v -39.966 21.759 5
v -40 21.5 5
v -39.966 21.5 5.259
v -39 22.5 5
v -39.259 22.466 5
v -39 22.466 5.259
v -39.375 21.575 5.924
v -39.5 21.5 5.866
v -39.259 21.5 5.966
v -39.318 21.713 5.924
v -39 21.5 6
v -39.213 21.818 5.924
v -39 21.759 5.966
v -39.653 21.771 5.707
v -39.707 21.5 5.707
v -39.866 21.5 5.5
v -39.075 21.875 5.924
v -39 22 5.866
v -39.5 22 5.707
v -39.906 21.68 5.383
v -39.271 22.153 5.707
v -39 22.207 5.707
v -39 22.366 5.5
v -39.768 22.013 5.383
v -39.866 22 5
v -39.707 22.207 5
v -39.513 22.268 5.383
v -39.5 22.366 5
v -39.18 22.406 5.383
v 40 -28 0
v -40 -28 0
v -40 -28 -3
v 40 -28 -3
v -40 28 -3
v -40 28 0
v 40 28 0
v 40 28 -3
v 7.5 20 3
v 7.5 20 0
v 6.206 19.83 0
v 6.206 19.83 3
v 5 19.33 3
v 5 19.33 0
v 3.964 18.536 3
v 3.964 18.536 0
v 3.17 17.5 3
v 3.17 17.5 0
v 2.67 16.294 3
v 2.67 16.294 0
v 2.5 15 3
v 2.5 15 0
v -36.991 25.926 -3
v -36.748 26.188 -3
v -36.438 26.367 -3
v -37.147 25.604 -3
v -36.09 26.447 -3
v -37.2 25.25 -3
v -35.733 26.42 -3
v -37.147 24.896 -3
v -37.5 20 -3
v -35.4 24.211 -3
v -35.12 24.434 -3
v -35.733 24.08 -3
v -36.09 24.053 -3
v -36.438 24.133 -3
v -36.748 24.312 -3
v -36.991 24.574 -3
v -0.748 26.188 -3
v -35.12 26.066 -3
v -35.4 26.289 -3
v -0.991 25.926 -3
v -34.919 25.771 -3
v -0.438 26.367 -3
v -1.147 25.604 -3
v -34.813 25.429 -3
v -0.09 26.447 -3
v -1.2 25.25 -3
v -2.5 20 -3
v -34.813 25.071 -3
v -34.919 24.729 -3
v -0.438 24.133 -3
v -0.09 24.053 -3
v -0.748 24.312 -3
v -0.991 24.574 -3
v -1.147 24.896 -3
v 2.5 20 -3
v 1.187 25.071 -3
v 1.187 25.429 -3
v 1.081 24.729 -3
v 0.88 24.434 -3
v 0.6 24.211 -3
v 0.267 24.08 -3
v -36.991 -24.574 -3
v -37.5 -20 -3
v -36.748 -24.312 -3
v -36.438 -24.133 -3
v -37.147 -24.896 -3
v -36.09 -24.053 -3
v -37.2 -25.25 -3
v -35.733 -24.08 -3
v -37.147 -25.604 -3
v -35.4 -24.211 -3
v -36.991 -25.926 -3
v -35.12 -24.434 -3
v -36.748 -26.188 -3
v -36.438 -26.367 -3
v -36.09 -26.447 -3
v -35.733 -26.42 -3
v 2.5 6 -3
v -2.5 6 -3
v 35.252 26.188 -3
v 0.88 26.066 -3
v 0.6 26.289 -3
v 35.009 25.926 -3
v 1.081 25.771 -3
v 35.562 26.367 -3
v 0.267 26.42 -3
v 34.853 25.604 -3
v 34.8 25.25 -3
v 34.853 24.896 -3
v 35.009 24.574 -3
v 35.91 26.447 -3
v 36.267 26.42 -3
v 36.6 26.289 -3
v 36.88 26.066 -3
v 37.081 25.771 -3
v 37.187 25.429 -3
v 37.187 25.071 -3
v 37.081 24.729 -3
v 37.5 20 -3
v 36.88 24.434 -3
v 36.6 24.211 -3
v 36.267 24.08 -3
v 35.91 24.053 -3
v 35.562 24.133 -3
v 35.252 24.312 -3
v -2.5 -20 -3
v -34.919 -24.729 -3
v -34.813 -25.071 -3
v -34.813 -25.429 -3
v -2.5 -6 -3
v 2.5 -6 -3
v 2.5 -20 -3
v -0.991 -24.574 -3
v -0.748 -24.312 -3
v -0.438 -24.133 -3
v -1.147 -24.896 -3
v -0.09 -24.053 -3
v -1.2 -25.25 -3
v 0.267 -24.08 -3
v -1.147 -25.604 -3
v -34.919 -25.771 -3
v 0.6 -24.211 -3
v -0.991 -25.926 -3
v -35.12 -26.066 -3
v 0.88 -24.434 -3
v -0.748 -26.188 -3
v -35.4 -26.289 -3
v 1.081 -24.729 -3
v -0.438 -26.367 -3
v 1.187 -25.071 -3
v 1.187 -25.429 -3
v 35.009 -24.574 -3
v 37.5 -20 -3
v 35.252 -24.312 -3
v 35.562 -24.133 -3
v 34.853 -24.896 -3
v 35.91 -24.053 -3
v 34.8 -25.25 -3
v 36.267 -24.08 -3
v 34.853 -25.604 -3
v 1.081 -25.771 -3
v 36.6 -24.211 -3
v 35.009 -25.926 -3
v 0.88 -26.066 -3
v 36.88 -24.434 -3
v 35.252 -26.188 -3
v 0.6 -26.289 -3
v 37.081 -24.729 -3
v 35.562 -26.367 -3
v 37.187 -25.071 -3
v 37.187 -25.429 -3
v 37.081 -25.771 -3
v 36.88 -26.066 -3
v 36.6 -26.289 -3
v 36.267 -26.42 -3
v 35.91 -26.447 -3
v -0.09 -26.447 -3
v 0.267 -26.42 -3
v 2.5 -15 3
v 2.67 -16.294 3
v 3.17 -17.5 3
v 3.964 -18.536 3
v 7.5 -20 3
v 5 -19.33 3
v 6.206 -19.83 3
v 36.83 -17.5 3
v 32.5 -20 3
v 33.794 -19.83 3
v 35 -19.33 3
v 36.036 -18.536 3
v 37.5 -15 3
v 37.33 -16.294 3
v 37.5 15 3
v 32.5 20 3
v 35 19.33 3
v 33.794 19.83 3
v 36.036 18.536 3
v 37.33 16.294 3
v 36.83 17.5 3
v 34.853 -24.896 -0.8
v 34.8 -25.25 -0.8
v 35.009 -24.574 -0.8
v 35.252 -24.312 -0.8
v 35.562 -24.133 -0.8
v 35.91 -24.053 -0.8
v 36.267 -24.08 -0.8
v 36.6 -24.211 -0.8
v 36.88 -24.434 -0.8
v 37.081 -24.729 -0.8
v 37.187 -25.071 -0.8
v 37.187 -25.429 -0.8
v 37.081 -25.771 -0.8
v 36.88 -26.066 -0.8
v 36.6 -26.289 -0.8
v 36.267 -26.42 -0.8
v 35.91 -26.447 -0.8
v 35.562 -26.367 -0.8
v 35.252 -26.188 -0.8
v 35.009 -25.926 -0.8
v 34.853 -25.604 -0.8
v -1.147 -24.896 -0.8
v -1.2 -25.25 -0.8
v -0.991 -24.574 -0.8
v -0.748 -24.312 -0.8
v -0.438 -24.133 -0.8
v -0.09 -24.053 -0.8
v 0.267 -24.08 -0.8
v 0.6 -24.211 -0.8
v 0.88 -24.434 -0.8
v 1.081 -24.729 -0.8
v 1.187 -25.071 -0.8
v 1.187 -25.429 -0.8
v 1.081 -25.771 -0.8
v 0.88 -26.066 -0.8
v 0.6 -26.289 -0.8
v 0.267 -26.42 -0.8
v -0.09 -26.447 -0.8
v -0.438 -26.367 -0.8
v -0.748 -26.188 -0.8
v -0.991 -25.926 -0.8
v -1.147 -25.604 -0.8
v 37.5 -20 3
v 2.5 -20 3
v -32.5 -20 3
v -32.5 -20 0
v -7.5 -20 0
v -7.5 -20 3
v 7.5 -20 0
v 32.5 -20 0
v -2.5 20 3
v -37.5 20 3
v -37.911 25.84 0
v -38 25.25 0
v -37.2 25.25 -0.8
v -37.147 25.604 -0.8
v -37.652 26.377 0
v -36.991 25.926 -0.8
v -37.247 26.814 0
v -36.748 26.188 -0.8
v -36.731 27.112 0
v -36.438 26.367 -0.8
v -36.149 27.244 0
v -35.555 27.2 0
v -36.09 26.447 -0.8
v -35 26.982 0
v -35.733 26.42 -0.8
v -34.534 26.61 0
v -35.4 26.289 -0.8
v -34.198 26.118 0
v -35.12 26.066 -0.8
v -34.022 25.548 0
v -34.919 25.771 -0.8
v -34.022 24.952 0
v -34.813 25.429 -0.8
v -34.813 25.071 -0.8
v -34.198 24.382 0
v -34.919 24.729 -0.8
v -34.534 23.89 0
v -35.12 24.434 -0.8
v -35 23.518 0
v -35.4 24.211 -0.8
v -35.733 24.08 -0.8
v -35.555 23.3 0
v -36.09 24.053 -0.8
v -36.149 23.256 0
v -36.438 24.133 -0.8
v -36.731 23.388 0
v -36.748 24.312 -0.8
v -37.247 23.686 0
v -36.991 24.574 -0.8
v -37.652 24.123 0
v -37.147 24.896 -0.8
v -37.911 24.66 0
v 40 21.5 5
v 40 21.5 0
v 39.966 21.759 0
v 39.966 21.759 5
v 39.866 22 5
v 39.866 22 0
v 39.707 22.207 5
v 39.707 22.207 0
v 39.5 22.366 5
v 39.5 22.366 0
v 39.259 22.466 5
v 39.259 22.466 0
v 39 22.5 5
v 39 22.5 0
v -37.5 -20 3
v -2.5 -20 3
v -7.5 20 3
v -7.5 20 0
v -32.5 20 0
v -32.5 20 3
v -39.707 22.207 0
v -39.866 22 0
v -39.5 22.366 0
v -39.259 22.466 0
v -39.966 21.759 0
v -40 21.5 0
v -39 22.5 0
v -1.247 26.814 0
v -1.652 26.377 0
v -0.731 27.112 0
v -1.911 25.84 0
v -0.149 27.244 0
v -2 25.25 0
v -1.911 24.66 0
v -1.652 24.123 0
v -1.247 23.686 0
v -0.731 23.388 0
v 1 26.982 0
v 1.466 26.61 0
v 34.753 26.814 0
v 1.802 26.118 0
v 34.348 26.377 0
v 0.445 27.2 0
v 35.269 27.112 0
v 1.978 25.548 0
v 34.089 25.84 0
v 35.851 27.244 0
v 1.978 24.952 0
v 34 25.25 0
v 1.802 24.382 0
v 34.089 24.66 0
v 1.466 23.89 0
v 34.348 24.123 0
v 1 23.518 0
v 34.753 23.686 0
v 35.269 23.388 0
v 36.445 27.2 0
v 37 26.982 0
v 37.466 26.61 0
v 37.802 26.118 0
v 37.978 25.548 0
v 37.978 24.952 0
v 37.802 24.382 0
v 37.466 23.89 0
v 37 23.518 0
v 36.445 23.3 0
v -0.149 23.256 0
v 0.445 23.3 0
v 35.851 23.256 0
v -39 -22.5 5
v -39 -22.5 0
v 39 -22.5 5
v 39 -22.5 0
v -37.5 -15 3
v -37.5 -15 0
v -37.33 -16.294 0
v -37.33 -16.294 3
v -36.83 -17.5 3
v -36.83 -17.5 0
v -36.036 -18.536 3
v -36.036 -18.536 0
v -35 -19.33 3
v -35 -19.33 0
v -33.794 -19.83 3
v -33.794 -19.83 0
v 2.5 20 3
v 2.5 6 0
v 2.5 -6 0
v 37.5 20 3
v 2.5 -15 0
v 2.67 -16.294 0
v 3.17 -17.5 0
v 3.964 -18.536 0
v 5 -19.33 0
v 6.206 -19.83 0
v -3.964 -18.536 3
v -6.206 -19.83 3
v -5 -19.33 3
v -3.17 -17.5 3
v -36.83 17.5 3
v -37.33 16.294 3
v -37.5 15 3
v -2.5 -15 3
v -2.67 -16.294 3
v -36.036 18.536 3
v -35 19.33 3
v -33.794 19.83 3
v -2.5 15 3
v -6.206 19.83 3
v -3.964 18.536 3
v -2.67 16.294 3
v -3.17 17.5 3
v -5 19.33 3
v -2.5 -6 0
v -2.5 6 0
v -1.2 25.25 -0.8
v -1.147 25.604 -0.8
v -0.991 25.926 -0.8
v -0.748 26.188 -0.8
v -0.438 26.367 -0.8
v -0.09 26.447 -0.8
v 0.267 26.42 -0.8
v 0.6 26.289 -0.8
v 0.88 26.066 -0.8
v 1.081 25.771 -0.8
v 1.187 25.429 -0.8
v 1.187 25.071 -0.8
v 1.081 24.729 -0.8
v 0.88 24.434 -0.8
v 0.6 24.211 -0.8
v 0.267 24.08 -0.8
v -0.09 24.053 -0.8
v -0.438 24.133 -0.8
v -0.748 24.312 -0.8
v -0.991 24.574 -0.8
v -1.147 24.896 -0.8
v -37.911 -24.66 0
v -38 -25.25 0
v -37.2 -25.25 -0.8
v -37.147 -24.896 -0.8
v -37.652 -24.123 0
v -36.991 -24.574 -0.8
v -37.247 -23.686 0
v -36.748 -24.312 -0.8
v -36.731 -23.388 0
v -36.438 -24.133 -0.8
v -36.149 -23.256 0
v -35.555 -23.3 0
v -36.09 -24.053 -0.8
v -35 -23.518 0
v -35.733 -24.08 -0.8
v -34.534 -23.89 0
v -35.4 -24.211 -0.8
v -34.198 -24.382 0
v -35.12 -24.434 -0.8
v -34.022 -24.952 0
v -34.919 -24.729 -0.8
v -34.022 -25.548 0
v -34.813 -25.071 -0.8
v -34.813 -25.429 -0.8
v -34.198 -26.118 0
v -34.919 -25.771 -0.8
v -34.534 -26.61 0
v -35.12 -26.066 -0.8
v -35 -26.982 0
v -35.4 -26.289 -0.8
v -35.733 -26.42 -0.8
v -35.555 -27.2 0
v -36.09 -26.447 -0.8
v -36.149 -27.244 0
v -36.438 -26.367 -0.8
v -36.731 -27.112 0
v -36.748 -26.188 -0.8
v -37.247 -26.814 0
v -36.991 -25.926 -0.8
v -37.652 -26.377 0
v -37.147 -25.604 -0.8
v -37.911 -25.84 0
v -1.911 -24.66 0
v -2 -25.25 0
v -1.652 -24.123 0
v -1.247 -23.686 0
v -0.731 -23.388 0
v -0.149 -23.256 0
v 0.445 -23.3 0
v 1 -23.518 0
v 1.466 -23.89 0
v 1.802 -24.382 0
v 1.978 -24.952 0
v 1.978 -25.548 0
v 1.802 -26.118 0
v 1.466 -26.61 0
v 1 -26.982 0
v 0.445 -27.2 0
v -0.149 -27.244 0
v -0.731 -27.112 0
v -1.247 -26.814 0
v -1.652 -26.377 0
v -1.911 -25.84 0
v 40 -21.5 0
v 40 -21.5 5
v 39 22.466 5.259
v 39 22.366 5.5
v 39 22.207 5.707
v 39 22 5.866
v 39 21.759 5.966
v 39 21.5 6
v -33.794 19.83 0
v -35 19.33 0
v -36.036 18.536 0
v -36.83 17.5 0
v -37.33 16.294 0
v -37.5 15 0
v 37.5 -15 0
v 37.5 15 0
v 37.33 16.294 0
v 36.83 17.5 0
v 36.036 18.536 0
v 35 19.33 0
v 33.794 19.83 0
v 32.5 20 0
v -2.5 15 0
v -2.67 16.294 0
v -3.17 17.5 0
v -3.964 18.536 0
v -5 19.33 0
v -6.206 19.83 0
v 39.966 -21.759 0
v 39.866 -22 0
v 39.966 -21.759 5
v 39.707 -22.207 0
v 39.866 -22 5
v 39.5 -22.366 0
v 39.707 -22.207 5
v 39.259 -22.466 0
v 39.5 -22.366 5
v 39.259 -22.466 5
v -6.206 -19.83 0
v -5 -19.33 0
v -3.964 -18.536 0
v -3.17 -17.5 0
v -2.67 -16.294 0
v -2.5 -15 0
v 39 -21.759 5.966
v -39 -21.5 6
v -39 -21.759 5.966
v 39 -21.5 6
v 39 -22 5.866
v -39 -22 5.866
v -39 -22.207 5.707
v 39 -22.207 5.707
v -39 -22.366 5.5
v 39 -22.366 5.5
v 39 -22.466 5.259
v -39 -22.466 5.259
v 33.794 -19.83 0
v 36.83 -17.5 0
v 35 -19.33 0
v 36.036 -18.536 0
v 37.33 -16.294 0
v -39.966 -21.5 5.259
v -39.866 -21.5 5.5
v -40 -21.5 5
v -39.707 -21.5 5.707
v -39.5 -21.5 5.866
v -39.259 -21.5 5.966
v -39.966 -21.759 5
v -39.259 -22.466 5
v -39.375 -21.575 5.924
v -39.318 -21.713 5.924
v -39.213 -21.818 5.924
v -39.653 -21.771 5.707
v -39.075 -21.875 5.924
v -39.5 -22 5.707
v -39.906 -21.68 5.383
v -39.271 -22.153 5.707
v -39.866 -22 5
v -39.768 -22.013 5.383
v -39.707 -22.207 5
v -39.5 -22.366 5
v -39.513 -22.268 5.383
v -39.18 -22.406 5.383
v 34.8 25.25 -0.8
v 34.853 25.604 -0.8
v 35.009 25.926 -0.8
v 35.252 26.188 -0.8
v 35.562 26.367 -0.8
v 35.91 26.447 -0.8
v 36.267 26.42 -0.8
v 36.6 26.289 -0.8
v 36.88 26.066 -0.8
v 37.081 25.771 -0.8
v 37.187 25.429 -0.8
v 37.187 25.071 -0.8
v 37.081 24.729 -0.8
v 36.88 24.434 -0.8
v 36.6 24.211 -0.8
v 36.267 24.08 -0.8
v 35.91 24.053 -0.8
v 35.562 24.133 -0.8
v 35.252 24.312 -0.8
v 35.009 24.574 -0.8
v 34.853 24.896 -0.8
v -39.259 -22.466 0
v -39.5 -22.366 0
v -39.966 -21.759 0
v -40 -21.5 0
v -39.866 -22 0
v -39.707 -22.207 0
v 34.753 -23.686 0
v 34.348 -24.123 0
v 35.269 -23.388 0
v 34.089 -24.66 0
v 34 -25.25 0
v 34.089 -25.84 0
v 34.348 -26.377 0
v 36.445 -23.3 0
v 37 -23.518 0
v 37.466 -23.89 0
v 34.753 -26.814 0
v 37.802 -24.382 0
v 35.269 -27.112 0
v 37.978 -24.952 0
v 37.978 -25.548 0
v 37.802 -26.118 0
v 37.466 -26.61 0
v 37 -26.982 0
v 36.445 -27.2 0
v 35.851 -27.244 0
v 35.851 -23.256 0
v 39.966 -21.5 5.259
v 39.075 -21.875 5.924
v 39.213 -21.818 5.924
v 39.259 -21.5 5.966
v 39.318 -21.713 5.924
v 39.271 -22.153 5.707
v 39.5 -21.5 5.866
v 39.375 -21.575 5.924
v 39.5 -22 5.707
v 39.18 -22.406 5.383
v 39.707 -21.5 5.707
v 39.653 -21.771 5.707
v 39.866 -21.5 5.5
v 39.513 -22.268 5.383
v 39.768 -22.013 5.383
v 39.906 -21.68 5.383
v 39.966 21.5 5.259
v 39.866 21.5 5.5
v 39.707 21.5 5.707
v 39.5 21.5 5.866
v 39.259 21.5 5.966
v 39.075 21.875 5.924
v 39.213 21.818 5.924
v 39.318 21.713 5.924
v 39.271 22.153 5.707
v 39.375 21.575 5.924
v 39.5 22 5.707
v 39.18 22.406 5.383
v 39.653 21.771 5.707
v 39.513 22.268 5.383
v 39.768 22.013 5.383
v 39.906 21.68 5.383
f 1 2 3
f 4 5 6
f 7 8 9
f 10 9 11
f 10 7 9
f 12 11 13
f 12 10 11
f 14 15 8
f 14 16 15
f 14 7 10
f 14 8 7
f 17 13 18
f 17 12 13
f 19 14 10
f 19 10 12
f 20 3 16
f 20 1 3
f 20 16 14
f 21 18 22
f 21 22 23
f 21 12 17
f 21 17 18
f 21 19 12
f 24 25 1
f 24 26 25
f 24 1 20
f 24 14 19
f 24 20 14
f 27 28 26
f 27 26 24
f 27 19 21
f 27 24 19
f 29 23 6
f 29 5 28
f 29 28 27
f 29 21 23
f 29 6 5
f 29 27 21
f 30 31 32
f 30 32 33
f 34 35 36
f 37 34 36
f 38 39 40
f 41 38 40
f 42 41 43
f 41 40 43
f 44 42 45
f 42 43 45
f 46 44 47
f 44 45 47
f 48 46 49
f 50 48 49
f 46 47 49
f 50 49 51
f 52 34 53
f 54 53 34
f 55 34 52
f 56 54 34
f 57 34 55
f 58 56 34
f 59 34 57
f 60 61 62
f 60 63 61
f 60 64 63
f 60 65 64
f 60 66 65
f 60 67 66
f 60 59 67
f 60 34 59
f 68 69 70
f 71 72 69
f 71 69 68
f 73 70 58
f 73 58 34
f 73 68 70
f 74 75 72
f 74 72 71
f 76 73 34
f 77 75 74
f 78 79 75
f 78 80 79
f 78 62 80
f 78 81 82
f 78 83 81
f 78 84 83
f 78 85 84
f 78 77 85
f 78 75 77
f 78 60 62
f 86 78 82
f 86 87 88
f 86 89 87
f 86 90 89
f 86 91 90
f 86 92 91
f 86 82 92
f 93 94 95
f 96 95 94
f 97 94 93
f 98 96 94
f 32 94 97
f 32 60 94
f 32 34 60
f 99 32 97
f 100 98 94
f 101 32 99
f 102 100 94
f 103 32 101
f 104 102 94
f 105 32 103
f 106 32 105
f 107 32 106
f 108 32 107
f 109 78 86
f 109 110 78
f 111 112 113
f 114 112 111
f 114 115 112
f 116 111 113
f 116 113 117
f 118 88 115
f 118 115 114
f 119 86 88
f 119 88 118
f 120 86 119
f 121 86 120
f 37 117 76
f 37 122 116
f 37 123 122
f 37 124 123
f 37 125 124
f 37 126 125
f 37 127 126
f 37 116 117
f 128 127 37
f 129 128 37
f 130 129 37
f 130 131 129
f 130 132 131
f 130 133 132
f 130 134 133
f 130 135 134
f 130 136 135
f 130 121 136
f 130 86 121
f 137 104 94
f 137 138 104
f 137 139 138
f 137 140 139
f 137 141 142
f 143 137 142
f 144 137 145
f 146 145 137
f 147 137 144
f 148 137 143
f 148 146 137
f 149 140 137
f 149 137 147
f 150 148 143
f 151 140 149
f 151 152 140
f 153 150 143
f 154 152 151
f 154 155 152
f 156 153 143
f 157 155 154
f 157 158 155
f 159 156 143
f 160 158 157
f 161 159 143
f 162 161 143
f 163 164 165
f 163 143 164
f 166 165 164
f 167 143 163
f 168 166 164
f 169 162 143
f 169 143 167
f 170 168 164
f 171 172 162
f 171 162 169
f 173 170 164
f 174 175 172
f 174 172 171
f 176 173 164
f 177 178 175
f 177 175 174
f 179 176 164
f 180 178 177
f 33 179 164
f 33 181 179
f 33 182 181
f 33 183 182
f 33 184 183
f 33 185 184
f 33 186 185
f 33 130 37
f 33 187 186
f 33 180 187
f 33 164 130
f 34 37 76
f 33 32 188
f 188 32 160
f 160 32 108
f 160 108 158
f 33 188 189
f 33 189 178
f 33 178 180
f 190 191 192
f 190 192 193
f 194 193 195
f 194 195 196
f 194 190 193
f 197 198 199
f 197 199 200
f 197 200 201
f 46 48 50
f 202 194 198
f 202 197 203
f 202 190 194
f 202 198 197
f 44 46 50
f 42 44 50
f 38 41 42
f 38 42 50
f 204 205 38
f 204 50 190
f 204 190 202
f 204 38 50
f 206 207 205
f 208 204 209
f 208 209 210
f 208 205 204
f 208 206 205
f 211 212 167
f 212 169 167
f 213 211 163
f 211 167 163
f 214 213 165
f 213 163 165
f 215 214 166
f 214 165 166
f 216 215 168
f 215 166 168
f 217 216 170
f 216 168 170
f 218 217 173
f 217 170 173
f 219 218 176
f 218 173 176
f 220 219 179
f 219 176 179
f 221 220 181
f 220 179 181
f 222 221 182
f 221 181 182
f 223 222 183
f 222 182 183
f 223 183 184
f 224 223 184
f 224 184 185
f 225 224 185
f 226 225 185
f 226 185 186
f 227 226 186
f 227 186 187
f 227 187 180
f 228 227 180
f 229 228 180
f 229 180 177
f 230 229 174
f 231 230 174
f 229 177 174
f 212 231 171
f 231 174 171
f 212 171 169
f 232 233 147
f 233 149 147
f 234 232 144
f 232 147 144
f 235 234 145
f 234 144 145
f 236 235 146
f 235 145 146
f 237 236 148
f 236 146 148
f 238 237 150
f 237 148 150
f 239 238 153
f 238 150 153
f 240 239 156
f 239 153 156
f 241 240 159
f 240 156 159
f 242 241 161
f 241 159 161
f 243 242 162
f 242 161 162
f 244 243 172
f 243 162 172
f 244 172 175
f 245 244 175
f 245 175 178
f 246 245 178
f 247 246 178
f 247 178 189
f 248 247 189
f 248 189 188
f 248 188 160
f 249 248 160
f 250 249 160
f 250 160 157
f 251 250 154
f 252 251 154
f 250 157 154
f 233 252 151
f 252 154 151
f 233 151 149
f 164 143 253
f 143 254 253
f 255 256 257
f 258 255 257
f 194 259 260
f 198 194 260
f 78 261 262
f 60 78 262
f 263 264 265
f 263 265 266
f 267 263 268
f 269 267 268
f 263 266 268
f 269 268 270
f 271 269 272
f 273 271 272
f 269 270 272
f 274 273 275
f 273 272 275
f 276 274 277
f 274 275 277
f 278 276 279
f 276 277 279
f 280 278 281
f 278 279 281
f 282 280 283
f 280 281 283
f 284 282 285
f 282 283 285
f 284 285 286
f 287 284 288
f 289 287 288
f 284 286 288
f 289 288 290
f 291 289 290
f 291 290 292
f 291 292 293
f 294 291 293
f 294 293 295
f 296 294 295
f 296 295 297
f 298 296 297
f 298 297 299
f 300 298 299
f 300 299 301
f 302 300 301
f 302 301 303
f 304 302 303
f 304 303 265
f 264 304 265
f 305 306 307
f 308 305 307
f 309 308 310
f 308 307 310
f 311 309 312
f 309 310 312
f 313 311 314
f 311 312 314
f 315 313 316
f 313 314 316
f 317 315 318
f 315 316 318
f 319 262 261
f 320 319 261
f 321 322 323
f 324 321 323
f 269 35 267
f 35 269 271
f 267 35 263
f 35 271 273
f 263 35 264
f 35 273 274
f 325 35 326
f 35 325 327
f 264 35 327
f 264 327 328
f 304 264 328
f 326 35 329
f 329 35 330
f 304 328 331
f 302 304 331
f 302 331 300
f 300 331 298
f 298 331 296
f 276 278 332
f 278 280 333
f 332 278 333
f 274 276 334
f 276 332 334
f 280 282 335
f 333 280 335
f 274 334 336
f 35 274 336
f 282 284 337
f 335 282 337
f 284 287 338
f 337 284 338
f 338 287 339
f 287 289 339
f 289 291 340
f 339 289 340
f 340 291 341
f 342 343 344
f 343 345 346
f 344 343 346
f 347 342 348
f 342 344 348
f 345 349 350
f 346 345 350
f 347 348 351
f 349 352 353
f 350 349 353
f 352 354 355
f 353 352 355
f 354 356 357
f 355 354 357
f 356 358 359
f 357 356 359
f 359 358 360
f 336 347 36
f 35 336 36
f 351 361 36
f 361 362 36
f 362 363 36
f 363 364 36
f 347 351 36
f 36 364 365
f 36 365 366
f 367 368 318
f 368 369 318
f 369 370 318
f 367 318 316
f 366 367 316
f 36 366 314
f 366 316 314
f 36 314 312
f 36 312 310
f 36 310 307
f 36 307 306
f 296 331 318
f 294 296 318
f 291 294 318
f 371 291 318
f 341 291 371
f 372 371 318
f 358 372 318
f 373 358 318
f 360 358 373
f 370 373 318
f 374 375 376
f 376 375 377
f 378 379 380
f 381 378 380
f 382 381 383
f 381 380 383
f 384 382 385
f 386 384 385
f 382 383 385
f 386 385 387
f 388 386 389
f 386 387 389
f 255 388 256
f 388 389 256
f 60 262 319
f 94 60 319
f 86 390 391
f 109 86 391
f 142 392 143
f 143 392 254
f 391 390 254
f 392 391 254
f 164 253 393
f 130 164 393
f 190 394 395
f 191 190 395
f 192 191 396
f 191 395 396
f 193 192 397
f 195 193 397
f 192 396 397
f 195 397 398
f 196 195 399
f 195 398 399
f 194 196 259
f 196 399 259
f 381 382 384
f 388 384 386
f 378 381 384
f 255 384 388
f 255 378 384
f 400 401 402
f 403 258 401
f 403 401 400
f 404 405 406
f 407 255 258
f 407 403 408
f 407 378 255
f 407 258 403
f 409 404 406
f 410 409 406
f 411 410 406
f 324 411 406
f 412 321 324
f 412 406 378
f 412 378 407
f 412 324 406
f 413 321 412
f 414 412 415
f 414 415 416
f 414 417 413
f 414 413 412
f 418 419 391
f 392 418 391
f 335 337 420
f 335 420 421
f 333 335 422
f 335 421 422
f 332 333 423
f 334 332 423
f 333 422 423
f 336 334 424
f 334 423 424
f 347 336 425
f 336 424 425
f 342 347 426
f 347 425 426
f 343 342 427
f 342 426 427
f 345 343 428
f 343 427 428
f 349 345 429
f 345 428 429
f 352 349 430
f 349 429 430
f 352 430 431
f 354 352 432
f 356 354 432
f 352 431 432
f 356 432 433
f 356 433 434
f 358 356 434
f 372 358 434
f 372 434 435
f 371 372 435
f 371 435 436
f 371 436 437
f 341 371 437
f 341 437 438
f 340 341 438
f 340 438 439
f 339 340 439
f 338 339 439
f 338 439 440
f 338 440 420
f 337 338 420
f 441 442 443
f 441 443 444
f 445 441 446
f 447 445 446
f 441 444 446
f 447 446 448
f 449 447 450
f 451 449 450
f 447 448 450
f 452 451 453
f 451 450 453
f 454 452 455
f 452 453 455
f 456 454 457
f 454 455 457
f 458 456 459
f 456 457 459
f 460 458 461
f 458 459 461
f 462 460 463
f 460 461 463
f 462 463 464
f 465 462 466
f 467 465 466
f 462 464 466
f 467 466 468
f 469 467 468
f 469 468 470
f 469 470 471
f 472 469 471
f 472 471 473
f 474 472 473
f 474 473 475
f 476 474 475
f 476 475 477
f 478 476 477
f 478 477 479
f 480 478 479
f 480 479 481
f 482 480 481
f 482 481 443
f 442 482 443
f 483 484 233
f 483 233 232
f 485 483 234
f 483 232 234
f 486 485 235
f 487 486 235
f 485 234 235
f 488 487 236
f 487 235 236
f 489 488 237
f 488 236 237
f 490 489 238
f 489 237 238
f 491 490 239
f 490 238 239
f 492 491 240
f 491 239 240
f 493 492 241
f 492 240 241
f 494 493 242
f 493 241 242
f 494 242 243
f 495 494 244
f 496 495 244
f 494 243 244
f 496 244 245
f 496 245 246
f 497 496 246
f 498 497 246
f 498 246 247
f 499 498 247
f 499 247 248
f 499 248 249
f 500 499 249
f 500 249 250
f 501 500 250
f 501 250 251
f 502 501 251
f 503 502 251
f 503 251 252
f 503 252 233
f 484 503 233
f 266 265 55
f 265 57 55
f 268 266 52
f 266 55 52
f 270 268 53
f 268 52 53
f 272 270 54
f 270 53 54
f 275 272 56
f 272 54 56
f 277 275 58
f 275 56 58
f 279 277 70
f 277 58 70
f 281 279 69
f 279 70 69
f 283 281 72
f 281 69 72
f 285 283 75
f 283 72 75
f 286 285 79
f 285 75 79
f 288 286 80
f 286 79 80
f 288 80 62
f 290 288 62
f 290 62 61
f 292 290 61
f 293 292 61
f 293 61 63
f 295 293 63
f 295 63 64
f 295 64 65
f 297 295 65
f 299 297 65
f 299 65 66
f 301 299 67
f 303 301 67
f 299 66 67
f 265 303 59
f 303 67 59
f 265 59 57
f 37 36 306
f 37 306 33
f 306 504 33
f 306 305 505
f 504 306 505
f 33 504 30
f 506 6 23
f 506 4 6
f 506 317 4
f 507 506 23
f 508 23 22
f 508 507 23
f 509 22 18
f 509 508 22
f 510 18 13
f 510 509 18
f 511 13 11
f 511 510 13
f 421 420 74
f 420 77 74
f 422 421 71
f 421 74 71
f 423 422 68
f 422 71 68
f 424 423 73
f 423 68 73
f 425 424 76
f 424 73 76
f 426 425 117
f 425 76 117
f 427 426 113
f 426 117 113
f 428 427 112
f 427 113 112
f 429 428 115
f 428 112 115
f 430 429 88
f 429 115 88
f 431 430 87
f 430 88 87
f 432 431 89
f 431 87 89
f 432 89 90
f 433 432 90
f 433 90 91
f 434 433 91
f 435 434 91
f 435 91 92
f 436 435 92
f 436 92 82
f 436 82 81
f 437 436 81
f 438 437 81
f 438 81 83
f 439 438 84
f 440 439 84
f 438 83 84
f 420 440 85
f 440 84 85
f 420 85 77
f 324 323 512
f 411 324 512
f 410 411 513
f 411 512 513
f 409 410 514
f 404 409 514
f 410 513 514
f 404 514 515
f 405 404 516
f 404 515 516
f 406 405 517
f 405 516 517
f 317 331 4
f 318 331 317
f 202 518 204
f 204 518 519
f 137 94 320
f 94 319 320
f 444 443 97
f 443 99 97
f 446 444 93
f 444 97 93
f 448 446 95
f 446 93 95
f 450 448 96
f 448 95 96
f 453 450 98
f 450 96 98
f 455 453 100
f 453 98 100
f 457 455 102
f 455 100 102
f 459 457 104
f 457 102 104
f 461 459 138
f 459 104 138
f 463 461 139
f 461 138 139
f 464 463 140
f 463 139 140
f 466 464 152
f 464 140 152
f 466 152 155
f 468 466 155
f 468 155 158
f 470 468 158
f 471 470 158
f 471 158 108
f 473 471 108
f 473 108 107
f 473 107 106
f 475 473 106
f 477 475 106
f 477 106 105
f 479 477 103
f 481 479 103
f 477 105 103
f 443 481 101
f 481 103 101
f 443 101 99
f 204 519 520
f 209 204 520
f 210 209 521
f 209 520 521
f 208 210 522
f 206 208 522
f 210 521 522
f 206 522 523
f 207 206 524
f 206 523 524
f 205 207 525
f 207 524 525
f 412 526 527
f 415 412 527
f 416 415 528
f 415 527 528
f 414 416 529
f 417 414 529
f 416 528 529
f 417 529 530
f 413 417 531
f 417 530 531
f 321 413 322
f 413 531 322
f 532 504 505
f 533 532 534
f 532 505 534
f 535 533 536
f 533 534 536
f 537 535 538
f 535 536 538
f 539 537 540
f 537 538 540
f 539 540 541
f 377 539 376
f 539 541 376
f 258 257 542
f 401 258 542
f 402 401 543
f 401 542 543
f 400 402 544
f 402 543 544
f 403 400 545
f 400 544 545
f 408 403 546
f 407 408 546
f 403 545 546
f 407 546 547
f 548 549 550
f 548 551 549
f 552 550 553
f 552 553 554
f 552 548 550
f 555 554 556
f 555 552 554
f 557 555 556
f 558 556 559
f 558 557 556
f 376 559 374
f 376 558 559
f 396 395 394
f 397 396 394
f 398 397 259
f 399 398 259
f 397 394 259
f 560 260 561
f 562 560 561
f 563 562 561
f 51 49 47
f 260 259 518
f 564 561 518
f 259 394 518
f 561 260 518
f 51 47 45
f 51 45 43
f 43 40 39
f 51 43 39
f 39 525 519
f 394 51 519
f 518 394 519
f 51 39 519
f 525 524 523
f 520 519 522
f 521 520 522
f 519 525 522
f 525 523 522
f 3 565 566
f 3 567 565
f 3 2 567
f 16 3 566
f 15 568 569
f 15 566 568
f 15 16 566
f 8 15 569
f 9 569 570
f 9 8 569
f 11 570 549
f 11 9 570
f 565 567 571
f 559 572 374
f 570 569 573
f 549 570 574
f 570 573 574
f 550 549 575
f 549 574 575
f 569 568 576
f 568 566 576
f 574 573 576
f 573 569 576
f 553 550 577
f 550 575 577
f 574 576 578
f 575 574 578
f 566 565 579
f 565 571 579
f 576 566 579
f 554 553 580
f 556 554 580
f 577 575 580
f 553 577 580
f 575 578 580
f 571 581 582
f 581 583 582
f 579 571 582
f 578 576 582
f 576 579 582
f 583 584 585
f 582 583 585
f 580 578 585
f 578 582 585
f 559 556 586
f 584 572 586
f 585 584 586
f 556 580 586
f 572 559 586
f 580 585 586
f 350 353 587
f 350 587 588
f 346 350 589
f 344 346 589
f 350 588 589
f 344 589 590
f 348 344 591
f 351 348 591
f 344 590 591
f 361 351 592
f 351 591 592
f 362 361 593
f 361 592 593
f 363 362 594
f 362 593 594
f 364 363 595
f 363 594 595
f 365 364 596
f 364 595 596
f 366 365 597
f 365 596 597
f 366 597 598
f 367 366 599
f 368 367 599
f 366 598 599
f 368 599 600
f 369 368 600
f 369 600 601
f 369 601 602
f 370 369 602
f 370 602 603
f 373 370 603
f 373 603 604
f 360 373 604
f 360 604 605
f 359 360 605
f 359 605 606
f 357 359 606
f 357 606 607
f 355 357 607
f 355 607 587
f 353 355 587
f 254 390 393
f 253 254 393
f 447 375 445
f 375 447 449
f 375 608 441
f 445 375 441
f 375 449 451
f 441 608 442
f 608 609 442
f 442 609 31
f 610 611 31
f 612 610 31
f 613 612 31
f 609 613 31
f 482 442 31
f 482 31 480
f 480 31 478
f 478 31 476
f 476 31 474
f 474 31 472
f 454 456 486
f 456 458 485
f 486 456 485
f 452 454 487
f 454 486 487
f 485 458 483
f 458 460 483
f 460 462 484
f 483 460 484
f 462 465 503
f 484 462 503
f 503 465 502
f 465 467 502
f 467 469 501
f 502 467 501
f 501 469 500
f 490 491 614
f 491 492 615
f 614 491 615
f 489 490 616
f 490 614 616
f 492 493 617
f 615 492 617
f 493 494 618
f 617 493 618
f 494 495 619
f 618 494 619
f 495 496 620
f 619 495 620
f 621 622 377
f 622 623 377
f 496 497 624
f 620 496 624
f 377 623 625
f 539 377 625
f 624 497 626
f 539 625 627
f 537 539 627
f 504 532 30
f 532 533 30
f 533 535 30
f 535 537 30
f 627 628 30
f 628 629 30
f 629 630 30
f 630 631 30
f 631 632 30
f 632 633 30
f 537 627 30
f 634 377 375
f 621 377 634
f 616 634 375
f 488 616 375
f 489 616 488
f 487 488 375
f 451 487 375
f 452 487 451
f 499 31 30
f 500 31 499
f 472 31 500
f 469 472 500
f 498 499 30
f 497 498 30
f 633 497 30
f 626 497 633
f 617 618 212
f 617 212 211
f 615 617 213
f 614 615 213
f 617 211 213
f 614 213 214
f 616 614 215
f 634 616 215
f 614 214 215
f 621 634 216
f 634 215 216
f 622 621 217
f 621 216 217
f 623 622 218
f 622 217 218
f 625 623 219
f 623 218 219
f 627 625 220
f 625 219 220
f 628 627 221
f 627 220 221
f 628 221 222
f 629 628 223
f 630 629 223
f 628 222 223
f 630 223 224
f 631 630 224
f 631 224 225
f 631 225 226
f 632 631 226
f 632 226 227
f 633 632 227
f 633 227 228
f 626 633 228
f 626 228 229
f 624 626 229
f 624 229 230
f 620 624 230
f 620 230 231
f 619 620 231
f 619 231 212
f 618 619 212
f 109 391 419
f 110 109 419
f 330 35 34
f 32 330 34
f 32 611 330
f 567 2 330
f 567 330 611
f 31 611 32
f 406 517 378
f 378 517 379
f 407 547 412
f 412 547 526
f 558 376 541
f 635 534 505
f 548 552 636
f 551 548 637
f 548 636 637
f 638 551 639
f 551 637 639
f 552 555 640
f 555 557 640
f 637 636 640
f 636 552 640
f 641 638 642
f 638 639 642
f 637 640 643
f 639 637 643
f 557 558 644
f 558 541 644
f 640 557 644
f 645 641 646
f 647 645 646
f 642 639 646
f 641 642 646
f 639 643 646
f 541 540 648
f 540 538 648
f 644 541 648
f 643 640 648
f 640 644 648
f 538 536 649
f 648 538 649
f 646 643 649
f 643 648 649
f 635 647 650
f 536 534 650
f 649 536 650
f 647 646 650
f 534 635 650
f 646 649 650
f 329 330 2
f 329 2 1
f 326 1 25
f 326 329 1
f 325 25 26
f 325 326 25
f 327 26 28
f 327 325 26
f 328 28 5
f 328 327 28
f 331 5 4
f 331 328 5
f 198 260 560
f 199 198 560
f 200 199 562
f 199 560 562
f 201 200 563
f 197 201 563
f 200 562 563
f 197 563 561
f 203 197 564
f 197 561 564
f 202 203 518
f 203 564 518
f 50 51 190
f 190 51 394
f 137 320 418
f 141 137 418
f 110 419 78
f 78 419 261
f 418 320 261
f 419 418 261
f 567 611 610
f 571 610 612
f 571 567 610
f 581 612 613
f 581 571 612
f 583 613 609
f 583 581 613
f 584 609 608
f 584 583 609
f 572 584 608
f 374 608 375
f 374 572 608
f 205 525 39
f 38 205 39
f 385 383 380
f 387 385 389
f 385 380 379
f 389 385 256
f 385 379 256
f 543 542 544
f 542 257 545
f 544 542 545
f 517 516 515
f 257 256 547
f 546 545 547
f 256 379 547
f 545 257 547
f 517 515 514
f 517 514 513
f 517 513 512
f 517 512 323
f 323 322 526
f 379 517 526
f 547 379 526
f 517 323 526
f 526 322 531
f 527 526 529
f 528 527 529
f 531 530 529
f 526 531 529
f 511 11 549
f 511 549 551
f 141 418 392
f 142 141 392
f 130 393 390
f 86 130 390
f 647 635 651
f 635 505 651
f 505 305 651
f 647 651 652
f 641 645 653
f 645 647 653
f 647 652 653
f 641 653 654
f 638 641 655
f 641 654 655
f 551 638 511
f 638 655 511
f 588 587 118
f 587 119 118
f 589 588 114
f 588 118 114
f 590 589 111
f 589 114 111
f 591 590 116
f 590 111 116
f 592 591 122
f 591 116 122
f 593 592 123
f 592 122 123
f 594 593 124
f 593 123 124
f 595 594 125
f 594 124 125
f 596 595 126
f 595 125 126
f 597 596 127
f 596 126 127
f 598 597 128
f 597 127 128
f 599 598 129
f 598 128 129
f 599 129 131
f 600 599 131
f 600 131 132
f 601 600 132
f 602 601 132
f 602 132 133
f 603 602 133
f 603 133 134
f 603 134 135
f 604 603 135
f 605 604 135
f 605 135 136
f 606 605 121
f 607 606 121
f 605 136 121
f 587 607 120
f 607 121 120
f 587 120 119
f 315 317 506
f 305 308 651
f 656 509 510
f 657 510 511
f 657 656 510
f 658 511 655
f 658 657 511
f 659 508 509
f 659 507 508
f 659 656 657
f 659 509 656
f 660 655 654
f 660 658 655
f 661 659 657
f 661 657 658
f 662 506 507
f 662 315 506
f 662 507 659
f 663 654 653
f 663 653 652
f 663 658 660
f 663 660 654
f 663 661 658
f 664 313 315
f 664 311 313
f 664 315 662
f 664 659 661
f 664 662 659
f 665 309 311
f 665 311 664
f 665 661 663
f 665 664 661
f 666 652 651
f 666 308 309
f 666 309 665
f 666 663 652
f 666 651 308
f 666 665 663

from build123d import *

# Parameters (mm, degrees)
PAD001_DEPTH     = 3
SKETCH002_W      = 80
SKETCH002_H      = 45
SKETCH002_W_2    = 35
SKETCH002_H_2    = 40
PAD002_DEPTH     = 3
SKETCH_W         = 80
SKETCH_H         = 45
PAD_DEPTH        = 3
SKETCH005_W      = 80
SKETCH005_H      = 56
PAD004_DEPTH     = 3
HOLE_D           = 2.4
HOLE_DEPTH       = 198.867435
HOLE_CSINK_D     = 4
HOLE_CSINK_ANGLE = 90
FILLET_R         = 1
PAD003_DEPTH     = 3


with BuildPart() as body001:
    # Sketch001 → Pad001 (new body)
    with BuildSketch(Plane.XY):
        with BuildLine():
            Line((37.5, -15), (37.5, 15))
            ThreePointArc((37.5, 15), (36.035534, 18.535534), (32.5, 20))
            Line((32.5, 20), (7.5, 20))
            ThreePointArc((7.5, 20), (3.964466, 18.535534), (2.5, 15))
            Line((2.5, 15), (2.5, -15))
            ThreePointArc((2.5, -15), (3.964466, -18.535534), (7.5, -20))
            Line((7.5, -20), (32.5, -20))
            ThreePointArc((32.5, -20), (36.035534, -18.535534), (37.5, -15))
        make_face()
    extrude(amount=PAD001_DEPTH)


with BuildPart() as cuerpo:
    # Sketch002 (on Sketch) → Pad002 (new body)
    with BuildSketch(Plane.XY):
        Rectangle(SKETCH002_W, SKETCH002_H)
        with Locations((-20, 0)):
            Rectangle(SKETCH002_W_2, SKETCH002_H_2, mode=Mode.SUBTRACT)
        with Locations((20, 0)):
            Rectangle(SKETCH002_W_2, SKETCH002_H_2, mode=Mode.SUBTRACT)
    extrude(amount=PAD002_DEPTH)

    # Sketch (on Face14 of Pad002) → Pad (join)
    with BuildSketch(Plane.XY.offset(3)):
        Rectangle(SKETCH_W, SKETCH_H)
    extrude(amount=PAD_DEPTH)

    # Sketch005 (on Face4 of Pad) → Pad004 (join)
    with BuildSketch(Plane(origin=(0, 0, 0), x_dir=(1, 0, 0), z_dir=(0, 0, -1))):
        Rectangle(SKETCH005_W, SKETCH005_H)
        Polygon((-37.5, 20), (-2.5, 20), (-2.5, 6), (2.5, 6), (2.5, 20), (37.5, 20), (37.5, -20), (2.5, -20), (2.5, -6), (-2.5, -6), (-2.5, -20), (-37.5, -20), align=None, mode=Mode.SUBTRACT)
    extrude(amount=PAD004_DEPTH)

    # Hole
    with Locations(Plane.XY):
        with Locations((-36, -25.25), (0, -25.25), (36, -25.25), (-36, 25.25), (0, 25.25), (36, 25.25)):
            CounterSinkHole(HOLE_D / 2, HOLE_CSINK_D / 2, depth=HOLE_DEPTH, counter_sink_angle=HOLE_CSINK_ANGLE)

    # Fillet
    fillet_edges = [cuerpo.edges().sort_by_distance(p)[0] for p in [
        (40, -22.5, 4.5),
        (40, -22.5, 1.5),
        (40, 22.5, 4.5),
        (40, 22.5, 1.5),
        (-40, -22.5, 4.5),
        (-40, -22.5, 1.5),
        (-40, 22.5, 4.5),
        (-40, 22.5, 1.5),
        (-40, 0, 6),
        (0, -22.5, 6),
        (0, 22.5, 6),
        (40, 0, 6),
    ]]
    fillet(fillet_edges, radius=FILLET_R)


with BuildPart() as body003:
    # Sketch003 → Pad003 (new body)
    with BuildSketch(Plane.XY):
        with BuildLine():
            Line((-2.5, -15), (-2.5, 15))
            ThreePointArc((-2.5, 15), (-3.964466, 18.535534), (-7.5, 20))
            Line((-7.5, 20), (-32.5, 20))
            ThreePointArc((-32.5, 20), (-36.035534, 18.535534), (-37.5, 15))
            Line((-37.5, 15), (-37.5, -15))
            ThreePointArc((-37.5, -15), (-36.035534, -18.535534), (-32.5, -20))
            Line((-32.5, -20), (-7.5, -20))
            ThreePointArc((-7.5, -20), (-3.964466, -18.535534), (-2.5, -15))
        make_face()
    extrude(amount=PAD003_DEPTH)


solid = Compound([body001.part, cuerpo.part, body003.part])
